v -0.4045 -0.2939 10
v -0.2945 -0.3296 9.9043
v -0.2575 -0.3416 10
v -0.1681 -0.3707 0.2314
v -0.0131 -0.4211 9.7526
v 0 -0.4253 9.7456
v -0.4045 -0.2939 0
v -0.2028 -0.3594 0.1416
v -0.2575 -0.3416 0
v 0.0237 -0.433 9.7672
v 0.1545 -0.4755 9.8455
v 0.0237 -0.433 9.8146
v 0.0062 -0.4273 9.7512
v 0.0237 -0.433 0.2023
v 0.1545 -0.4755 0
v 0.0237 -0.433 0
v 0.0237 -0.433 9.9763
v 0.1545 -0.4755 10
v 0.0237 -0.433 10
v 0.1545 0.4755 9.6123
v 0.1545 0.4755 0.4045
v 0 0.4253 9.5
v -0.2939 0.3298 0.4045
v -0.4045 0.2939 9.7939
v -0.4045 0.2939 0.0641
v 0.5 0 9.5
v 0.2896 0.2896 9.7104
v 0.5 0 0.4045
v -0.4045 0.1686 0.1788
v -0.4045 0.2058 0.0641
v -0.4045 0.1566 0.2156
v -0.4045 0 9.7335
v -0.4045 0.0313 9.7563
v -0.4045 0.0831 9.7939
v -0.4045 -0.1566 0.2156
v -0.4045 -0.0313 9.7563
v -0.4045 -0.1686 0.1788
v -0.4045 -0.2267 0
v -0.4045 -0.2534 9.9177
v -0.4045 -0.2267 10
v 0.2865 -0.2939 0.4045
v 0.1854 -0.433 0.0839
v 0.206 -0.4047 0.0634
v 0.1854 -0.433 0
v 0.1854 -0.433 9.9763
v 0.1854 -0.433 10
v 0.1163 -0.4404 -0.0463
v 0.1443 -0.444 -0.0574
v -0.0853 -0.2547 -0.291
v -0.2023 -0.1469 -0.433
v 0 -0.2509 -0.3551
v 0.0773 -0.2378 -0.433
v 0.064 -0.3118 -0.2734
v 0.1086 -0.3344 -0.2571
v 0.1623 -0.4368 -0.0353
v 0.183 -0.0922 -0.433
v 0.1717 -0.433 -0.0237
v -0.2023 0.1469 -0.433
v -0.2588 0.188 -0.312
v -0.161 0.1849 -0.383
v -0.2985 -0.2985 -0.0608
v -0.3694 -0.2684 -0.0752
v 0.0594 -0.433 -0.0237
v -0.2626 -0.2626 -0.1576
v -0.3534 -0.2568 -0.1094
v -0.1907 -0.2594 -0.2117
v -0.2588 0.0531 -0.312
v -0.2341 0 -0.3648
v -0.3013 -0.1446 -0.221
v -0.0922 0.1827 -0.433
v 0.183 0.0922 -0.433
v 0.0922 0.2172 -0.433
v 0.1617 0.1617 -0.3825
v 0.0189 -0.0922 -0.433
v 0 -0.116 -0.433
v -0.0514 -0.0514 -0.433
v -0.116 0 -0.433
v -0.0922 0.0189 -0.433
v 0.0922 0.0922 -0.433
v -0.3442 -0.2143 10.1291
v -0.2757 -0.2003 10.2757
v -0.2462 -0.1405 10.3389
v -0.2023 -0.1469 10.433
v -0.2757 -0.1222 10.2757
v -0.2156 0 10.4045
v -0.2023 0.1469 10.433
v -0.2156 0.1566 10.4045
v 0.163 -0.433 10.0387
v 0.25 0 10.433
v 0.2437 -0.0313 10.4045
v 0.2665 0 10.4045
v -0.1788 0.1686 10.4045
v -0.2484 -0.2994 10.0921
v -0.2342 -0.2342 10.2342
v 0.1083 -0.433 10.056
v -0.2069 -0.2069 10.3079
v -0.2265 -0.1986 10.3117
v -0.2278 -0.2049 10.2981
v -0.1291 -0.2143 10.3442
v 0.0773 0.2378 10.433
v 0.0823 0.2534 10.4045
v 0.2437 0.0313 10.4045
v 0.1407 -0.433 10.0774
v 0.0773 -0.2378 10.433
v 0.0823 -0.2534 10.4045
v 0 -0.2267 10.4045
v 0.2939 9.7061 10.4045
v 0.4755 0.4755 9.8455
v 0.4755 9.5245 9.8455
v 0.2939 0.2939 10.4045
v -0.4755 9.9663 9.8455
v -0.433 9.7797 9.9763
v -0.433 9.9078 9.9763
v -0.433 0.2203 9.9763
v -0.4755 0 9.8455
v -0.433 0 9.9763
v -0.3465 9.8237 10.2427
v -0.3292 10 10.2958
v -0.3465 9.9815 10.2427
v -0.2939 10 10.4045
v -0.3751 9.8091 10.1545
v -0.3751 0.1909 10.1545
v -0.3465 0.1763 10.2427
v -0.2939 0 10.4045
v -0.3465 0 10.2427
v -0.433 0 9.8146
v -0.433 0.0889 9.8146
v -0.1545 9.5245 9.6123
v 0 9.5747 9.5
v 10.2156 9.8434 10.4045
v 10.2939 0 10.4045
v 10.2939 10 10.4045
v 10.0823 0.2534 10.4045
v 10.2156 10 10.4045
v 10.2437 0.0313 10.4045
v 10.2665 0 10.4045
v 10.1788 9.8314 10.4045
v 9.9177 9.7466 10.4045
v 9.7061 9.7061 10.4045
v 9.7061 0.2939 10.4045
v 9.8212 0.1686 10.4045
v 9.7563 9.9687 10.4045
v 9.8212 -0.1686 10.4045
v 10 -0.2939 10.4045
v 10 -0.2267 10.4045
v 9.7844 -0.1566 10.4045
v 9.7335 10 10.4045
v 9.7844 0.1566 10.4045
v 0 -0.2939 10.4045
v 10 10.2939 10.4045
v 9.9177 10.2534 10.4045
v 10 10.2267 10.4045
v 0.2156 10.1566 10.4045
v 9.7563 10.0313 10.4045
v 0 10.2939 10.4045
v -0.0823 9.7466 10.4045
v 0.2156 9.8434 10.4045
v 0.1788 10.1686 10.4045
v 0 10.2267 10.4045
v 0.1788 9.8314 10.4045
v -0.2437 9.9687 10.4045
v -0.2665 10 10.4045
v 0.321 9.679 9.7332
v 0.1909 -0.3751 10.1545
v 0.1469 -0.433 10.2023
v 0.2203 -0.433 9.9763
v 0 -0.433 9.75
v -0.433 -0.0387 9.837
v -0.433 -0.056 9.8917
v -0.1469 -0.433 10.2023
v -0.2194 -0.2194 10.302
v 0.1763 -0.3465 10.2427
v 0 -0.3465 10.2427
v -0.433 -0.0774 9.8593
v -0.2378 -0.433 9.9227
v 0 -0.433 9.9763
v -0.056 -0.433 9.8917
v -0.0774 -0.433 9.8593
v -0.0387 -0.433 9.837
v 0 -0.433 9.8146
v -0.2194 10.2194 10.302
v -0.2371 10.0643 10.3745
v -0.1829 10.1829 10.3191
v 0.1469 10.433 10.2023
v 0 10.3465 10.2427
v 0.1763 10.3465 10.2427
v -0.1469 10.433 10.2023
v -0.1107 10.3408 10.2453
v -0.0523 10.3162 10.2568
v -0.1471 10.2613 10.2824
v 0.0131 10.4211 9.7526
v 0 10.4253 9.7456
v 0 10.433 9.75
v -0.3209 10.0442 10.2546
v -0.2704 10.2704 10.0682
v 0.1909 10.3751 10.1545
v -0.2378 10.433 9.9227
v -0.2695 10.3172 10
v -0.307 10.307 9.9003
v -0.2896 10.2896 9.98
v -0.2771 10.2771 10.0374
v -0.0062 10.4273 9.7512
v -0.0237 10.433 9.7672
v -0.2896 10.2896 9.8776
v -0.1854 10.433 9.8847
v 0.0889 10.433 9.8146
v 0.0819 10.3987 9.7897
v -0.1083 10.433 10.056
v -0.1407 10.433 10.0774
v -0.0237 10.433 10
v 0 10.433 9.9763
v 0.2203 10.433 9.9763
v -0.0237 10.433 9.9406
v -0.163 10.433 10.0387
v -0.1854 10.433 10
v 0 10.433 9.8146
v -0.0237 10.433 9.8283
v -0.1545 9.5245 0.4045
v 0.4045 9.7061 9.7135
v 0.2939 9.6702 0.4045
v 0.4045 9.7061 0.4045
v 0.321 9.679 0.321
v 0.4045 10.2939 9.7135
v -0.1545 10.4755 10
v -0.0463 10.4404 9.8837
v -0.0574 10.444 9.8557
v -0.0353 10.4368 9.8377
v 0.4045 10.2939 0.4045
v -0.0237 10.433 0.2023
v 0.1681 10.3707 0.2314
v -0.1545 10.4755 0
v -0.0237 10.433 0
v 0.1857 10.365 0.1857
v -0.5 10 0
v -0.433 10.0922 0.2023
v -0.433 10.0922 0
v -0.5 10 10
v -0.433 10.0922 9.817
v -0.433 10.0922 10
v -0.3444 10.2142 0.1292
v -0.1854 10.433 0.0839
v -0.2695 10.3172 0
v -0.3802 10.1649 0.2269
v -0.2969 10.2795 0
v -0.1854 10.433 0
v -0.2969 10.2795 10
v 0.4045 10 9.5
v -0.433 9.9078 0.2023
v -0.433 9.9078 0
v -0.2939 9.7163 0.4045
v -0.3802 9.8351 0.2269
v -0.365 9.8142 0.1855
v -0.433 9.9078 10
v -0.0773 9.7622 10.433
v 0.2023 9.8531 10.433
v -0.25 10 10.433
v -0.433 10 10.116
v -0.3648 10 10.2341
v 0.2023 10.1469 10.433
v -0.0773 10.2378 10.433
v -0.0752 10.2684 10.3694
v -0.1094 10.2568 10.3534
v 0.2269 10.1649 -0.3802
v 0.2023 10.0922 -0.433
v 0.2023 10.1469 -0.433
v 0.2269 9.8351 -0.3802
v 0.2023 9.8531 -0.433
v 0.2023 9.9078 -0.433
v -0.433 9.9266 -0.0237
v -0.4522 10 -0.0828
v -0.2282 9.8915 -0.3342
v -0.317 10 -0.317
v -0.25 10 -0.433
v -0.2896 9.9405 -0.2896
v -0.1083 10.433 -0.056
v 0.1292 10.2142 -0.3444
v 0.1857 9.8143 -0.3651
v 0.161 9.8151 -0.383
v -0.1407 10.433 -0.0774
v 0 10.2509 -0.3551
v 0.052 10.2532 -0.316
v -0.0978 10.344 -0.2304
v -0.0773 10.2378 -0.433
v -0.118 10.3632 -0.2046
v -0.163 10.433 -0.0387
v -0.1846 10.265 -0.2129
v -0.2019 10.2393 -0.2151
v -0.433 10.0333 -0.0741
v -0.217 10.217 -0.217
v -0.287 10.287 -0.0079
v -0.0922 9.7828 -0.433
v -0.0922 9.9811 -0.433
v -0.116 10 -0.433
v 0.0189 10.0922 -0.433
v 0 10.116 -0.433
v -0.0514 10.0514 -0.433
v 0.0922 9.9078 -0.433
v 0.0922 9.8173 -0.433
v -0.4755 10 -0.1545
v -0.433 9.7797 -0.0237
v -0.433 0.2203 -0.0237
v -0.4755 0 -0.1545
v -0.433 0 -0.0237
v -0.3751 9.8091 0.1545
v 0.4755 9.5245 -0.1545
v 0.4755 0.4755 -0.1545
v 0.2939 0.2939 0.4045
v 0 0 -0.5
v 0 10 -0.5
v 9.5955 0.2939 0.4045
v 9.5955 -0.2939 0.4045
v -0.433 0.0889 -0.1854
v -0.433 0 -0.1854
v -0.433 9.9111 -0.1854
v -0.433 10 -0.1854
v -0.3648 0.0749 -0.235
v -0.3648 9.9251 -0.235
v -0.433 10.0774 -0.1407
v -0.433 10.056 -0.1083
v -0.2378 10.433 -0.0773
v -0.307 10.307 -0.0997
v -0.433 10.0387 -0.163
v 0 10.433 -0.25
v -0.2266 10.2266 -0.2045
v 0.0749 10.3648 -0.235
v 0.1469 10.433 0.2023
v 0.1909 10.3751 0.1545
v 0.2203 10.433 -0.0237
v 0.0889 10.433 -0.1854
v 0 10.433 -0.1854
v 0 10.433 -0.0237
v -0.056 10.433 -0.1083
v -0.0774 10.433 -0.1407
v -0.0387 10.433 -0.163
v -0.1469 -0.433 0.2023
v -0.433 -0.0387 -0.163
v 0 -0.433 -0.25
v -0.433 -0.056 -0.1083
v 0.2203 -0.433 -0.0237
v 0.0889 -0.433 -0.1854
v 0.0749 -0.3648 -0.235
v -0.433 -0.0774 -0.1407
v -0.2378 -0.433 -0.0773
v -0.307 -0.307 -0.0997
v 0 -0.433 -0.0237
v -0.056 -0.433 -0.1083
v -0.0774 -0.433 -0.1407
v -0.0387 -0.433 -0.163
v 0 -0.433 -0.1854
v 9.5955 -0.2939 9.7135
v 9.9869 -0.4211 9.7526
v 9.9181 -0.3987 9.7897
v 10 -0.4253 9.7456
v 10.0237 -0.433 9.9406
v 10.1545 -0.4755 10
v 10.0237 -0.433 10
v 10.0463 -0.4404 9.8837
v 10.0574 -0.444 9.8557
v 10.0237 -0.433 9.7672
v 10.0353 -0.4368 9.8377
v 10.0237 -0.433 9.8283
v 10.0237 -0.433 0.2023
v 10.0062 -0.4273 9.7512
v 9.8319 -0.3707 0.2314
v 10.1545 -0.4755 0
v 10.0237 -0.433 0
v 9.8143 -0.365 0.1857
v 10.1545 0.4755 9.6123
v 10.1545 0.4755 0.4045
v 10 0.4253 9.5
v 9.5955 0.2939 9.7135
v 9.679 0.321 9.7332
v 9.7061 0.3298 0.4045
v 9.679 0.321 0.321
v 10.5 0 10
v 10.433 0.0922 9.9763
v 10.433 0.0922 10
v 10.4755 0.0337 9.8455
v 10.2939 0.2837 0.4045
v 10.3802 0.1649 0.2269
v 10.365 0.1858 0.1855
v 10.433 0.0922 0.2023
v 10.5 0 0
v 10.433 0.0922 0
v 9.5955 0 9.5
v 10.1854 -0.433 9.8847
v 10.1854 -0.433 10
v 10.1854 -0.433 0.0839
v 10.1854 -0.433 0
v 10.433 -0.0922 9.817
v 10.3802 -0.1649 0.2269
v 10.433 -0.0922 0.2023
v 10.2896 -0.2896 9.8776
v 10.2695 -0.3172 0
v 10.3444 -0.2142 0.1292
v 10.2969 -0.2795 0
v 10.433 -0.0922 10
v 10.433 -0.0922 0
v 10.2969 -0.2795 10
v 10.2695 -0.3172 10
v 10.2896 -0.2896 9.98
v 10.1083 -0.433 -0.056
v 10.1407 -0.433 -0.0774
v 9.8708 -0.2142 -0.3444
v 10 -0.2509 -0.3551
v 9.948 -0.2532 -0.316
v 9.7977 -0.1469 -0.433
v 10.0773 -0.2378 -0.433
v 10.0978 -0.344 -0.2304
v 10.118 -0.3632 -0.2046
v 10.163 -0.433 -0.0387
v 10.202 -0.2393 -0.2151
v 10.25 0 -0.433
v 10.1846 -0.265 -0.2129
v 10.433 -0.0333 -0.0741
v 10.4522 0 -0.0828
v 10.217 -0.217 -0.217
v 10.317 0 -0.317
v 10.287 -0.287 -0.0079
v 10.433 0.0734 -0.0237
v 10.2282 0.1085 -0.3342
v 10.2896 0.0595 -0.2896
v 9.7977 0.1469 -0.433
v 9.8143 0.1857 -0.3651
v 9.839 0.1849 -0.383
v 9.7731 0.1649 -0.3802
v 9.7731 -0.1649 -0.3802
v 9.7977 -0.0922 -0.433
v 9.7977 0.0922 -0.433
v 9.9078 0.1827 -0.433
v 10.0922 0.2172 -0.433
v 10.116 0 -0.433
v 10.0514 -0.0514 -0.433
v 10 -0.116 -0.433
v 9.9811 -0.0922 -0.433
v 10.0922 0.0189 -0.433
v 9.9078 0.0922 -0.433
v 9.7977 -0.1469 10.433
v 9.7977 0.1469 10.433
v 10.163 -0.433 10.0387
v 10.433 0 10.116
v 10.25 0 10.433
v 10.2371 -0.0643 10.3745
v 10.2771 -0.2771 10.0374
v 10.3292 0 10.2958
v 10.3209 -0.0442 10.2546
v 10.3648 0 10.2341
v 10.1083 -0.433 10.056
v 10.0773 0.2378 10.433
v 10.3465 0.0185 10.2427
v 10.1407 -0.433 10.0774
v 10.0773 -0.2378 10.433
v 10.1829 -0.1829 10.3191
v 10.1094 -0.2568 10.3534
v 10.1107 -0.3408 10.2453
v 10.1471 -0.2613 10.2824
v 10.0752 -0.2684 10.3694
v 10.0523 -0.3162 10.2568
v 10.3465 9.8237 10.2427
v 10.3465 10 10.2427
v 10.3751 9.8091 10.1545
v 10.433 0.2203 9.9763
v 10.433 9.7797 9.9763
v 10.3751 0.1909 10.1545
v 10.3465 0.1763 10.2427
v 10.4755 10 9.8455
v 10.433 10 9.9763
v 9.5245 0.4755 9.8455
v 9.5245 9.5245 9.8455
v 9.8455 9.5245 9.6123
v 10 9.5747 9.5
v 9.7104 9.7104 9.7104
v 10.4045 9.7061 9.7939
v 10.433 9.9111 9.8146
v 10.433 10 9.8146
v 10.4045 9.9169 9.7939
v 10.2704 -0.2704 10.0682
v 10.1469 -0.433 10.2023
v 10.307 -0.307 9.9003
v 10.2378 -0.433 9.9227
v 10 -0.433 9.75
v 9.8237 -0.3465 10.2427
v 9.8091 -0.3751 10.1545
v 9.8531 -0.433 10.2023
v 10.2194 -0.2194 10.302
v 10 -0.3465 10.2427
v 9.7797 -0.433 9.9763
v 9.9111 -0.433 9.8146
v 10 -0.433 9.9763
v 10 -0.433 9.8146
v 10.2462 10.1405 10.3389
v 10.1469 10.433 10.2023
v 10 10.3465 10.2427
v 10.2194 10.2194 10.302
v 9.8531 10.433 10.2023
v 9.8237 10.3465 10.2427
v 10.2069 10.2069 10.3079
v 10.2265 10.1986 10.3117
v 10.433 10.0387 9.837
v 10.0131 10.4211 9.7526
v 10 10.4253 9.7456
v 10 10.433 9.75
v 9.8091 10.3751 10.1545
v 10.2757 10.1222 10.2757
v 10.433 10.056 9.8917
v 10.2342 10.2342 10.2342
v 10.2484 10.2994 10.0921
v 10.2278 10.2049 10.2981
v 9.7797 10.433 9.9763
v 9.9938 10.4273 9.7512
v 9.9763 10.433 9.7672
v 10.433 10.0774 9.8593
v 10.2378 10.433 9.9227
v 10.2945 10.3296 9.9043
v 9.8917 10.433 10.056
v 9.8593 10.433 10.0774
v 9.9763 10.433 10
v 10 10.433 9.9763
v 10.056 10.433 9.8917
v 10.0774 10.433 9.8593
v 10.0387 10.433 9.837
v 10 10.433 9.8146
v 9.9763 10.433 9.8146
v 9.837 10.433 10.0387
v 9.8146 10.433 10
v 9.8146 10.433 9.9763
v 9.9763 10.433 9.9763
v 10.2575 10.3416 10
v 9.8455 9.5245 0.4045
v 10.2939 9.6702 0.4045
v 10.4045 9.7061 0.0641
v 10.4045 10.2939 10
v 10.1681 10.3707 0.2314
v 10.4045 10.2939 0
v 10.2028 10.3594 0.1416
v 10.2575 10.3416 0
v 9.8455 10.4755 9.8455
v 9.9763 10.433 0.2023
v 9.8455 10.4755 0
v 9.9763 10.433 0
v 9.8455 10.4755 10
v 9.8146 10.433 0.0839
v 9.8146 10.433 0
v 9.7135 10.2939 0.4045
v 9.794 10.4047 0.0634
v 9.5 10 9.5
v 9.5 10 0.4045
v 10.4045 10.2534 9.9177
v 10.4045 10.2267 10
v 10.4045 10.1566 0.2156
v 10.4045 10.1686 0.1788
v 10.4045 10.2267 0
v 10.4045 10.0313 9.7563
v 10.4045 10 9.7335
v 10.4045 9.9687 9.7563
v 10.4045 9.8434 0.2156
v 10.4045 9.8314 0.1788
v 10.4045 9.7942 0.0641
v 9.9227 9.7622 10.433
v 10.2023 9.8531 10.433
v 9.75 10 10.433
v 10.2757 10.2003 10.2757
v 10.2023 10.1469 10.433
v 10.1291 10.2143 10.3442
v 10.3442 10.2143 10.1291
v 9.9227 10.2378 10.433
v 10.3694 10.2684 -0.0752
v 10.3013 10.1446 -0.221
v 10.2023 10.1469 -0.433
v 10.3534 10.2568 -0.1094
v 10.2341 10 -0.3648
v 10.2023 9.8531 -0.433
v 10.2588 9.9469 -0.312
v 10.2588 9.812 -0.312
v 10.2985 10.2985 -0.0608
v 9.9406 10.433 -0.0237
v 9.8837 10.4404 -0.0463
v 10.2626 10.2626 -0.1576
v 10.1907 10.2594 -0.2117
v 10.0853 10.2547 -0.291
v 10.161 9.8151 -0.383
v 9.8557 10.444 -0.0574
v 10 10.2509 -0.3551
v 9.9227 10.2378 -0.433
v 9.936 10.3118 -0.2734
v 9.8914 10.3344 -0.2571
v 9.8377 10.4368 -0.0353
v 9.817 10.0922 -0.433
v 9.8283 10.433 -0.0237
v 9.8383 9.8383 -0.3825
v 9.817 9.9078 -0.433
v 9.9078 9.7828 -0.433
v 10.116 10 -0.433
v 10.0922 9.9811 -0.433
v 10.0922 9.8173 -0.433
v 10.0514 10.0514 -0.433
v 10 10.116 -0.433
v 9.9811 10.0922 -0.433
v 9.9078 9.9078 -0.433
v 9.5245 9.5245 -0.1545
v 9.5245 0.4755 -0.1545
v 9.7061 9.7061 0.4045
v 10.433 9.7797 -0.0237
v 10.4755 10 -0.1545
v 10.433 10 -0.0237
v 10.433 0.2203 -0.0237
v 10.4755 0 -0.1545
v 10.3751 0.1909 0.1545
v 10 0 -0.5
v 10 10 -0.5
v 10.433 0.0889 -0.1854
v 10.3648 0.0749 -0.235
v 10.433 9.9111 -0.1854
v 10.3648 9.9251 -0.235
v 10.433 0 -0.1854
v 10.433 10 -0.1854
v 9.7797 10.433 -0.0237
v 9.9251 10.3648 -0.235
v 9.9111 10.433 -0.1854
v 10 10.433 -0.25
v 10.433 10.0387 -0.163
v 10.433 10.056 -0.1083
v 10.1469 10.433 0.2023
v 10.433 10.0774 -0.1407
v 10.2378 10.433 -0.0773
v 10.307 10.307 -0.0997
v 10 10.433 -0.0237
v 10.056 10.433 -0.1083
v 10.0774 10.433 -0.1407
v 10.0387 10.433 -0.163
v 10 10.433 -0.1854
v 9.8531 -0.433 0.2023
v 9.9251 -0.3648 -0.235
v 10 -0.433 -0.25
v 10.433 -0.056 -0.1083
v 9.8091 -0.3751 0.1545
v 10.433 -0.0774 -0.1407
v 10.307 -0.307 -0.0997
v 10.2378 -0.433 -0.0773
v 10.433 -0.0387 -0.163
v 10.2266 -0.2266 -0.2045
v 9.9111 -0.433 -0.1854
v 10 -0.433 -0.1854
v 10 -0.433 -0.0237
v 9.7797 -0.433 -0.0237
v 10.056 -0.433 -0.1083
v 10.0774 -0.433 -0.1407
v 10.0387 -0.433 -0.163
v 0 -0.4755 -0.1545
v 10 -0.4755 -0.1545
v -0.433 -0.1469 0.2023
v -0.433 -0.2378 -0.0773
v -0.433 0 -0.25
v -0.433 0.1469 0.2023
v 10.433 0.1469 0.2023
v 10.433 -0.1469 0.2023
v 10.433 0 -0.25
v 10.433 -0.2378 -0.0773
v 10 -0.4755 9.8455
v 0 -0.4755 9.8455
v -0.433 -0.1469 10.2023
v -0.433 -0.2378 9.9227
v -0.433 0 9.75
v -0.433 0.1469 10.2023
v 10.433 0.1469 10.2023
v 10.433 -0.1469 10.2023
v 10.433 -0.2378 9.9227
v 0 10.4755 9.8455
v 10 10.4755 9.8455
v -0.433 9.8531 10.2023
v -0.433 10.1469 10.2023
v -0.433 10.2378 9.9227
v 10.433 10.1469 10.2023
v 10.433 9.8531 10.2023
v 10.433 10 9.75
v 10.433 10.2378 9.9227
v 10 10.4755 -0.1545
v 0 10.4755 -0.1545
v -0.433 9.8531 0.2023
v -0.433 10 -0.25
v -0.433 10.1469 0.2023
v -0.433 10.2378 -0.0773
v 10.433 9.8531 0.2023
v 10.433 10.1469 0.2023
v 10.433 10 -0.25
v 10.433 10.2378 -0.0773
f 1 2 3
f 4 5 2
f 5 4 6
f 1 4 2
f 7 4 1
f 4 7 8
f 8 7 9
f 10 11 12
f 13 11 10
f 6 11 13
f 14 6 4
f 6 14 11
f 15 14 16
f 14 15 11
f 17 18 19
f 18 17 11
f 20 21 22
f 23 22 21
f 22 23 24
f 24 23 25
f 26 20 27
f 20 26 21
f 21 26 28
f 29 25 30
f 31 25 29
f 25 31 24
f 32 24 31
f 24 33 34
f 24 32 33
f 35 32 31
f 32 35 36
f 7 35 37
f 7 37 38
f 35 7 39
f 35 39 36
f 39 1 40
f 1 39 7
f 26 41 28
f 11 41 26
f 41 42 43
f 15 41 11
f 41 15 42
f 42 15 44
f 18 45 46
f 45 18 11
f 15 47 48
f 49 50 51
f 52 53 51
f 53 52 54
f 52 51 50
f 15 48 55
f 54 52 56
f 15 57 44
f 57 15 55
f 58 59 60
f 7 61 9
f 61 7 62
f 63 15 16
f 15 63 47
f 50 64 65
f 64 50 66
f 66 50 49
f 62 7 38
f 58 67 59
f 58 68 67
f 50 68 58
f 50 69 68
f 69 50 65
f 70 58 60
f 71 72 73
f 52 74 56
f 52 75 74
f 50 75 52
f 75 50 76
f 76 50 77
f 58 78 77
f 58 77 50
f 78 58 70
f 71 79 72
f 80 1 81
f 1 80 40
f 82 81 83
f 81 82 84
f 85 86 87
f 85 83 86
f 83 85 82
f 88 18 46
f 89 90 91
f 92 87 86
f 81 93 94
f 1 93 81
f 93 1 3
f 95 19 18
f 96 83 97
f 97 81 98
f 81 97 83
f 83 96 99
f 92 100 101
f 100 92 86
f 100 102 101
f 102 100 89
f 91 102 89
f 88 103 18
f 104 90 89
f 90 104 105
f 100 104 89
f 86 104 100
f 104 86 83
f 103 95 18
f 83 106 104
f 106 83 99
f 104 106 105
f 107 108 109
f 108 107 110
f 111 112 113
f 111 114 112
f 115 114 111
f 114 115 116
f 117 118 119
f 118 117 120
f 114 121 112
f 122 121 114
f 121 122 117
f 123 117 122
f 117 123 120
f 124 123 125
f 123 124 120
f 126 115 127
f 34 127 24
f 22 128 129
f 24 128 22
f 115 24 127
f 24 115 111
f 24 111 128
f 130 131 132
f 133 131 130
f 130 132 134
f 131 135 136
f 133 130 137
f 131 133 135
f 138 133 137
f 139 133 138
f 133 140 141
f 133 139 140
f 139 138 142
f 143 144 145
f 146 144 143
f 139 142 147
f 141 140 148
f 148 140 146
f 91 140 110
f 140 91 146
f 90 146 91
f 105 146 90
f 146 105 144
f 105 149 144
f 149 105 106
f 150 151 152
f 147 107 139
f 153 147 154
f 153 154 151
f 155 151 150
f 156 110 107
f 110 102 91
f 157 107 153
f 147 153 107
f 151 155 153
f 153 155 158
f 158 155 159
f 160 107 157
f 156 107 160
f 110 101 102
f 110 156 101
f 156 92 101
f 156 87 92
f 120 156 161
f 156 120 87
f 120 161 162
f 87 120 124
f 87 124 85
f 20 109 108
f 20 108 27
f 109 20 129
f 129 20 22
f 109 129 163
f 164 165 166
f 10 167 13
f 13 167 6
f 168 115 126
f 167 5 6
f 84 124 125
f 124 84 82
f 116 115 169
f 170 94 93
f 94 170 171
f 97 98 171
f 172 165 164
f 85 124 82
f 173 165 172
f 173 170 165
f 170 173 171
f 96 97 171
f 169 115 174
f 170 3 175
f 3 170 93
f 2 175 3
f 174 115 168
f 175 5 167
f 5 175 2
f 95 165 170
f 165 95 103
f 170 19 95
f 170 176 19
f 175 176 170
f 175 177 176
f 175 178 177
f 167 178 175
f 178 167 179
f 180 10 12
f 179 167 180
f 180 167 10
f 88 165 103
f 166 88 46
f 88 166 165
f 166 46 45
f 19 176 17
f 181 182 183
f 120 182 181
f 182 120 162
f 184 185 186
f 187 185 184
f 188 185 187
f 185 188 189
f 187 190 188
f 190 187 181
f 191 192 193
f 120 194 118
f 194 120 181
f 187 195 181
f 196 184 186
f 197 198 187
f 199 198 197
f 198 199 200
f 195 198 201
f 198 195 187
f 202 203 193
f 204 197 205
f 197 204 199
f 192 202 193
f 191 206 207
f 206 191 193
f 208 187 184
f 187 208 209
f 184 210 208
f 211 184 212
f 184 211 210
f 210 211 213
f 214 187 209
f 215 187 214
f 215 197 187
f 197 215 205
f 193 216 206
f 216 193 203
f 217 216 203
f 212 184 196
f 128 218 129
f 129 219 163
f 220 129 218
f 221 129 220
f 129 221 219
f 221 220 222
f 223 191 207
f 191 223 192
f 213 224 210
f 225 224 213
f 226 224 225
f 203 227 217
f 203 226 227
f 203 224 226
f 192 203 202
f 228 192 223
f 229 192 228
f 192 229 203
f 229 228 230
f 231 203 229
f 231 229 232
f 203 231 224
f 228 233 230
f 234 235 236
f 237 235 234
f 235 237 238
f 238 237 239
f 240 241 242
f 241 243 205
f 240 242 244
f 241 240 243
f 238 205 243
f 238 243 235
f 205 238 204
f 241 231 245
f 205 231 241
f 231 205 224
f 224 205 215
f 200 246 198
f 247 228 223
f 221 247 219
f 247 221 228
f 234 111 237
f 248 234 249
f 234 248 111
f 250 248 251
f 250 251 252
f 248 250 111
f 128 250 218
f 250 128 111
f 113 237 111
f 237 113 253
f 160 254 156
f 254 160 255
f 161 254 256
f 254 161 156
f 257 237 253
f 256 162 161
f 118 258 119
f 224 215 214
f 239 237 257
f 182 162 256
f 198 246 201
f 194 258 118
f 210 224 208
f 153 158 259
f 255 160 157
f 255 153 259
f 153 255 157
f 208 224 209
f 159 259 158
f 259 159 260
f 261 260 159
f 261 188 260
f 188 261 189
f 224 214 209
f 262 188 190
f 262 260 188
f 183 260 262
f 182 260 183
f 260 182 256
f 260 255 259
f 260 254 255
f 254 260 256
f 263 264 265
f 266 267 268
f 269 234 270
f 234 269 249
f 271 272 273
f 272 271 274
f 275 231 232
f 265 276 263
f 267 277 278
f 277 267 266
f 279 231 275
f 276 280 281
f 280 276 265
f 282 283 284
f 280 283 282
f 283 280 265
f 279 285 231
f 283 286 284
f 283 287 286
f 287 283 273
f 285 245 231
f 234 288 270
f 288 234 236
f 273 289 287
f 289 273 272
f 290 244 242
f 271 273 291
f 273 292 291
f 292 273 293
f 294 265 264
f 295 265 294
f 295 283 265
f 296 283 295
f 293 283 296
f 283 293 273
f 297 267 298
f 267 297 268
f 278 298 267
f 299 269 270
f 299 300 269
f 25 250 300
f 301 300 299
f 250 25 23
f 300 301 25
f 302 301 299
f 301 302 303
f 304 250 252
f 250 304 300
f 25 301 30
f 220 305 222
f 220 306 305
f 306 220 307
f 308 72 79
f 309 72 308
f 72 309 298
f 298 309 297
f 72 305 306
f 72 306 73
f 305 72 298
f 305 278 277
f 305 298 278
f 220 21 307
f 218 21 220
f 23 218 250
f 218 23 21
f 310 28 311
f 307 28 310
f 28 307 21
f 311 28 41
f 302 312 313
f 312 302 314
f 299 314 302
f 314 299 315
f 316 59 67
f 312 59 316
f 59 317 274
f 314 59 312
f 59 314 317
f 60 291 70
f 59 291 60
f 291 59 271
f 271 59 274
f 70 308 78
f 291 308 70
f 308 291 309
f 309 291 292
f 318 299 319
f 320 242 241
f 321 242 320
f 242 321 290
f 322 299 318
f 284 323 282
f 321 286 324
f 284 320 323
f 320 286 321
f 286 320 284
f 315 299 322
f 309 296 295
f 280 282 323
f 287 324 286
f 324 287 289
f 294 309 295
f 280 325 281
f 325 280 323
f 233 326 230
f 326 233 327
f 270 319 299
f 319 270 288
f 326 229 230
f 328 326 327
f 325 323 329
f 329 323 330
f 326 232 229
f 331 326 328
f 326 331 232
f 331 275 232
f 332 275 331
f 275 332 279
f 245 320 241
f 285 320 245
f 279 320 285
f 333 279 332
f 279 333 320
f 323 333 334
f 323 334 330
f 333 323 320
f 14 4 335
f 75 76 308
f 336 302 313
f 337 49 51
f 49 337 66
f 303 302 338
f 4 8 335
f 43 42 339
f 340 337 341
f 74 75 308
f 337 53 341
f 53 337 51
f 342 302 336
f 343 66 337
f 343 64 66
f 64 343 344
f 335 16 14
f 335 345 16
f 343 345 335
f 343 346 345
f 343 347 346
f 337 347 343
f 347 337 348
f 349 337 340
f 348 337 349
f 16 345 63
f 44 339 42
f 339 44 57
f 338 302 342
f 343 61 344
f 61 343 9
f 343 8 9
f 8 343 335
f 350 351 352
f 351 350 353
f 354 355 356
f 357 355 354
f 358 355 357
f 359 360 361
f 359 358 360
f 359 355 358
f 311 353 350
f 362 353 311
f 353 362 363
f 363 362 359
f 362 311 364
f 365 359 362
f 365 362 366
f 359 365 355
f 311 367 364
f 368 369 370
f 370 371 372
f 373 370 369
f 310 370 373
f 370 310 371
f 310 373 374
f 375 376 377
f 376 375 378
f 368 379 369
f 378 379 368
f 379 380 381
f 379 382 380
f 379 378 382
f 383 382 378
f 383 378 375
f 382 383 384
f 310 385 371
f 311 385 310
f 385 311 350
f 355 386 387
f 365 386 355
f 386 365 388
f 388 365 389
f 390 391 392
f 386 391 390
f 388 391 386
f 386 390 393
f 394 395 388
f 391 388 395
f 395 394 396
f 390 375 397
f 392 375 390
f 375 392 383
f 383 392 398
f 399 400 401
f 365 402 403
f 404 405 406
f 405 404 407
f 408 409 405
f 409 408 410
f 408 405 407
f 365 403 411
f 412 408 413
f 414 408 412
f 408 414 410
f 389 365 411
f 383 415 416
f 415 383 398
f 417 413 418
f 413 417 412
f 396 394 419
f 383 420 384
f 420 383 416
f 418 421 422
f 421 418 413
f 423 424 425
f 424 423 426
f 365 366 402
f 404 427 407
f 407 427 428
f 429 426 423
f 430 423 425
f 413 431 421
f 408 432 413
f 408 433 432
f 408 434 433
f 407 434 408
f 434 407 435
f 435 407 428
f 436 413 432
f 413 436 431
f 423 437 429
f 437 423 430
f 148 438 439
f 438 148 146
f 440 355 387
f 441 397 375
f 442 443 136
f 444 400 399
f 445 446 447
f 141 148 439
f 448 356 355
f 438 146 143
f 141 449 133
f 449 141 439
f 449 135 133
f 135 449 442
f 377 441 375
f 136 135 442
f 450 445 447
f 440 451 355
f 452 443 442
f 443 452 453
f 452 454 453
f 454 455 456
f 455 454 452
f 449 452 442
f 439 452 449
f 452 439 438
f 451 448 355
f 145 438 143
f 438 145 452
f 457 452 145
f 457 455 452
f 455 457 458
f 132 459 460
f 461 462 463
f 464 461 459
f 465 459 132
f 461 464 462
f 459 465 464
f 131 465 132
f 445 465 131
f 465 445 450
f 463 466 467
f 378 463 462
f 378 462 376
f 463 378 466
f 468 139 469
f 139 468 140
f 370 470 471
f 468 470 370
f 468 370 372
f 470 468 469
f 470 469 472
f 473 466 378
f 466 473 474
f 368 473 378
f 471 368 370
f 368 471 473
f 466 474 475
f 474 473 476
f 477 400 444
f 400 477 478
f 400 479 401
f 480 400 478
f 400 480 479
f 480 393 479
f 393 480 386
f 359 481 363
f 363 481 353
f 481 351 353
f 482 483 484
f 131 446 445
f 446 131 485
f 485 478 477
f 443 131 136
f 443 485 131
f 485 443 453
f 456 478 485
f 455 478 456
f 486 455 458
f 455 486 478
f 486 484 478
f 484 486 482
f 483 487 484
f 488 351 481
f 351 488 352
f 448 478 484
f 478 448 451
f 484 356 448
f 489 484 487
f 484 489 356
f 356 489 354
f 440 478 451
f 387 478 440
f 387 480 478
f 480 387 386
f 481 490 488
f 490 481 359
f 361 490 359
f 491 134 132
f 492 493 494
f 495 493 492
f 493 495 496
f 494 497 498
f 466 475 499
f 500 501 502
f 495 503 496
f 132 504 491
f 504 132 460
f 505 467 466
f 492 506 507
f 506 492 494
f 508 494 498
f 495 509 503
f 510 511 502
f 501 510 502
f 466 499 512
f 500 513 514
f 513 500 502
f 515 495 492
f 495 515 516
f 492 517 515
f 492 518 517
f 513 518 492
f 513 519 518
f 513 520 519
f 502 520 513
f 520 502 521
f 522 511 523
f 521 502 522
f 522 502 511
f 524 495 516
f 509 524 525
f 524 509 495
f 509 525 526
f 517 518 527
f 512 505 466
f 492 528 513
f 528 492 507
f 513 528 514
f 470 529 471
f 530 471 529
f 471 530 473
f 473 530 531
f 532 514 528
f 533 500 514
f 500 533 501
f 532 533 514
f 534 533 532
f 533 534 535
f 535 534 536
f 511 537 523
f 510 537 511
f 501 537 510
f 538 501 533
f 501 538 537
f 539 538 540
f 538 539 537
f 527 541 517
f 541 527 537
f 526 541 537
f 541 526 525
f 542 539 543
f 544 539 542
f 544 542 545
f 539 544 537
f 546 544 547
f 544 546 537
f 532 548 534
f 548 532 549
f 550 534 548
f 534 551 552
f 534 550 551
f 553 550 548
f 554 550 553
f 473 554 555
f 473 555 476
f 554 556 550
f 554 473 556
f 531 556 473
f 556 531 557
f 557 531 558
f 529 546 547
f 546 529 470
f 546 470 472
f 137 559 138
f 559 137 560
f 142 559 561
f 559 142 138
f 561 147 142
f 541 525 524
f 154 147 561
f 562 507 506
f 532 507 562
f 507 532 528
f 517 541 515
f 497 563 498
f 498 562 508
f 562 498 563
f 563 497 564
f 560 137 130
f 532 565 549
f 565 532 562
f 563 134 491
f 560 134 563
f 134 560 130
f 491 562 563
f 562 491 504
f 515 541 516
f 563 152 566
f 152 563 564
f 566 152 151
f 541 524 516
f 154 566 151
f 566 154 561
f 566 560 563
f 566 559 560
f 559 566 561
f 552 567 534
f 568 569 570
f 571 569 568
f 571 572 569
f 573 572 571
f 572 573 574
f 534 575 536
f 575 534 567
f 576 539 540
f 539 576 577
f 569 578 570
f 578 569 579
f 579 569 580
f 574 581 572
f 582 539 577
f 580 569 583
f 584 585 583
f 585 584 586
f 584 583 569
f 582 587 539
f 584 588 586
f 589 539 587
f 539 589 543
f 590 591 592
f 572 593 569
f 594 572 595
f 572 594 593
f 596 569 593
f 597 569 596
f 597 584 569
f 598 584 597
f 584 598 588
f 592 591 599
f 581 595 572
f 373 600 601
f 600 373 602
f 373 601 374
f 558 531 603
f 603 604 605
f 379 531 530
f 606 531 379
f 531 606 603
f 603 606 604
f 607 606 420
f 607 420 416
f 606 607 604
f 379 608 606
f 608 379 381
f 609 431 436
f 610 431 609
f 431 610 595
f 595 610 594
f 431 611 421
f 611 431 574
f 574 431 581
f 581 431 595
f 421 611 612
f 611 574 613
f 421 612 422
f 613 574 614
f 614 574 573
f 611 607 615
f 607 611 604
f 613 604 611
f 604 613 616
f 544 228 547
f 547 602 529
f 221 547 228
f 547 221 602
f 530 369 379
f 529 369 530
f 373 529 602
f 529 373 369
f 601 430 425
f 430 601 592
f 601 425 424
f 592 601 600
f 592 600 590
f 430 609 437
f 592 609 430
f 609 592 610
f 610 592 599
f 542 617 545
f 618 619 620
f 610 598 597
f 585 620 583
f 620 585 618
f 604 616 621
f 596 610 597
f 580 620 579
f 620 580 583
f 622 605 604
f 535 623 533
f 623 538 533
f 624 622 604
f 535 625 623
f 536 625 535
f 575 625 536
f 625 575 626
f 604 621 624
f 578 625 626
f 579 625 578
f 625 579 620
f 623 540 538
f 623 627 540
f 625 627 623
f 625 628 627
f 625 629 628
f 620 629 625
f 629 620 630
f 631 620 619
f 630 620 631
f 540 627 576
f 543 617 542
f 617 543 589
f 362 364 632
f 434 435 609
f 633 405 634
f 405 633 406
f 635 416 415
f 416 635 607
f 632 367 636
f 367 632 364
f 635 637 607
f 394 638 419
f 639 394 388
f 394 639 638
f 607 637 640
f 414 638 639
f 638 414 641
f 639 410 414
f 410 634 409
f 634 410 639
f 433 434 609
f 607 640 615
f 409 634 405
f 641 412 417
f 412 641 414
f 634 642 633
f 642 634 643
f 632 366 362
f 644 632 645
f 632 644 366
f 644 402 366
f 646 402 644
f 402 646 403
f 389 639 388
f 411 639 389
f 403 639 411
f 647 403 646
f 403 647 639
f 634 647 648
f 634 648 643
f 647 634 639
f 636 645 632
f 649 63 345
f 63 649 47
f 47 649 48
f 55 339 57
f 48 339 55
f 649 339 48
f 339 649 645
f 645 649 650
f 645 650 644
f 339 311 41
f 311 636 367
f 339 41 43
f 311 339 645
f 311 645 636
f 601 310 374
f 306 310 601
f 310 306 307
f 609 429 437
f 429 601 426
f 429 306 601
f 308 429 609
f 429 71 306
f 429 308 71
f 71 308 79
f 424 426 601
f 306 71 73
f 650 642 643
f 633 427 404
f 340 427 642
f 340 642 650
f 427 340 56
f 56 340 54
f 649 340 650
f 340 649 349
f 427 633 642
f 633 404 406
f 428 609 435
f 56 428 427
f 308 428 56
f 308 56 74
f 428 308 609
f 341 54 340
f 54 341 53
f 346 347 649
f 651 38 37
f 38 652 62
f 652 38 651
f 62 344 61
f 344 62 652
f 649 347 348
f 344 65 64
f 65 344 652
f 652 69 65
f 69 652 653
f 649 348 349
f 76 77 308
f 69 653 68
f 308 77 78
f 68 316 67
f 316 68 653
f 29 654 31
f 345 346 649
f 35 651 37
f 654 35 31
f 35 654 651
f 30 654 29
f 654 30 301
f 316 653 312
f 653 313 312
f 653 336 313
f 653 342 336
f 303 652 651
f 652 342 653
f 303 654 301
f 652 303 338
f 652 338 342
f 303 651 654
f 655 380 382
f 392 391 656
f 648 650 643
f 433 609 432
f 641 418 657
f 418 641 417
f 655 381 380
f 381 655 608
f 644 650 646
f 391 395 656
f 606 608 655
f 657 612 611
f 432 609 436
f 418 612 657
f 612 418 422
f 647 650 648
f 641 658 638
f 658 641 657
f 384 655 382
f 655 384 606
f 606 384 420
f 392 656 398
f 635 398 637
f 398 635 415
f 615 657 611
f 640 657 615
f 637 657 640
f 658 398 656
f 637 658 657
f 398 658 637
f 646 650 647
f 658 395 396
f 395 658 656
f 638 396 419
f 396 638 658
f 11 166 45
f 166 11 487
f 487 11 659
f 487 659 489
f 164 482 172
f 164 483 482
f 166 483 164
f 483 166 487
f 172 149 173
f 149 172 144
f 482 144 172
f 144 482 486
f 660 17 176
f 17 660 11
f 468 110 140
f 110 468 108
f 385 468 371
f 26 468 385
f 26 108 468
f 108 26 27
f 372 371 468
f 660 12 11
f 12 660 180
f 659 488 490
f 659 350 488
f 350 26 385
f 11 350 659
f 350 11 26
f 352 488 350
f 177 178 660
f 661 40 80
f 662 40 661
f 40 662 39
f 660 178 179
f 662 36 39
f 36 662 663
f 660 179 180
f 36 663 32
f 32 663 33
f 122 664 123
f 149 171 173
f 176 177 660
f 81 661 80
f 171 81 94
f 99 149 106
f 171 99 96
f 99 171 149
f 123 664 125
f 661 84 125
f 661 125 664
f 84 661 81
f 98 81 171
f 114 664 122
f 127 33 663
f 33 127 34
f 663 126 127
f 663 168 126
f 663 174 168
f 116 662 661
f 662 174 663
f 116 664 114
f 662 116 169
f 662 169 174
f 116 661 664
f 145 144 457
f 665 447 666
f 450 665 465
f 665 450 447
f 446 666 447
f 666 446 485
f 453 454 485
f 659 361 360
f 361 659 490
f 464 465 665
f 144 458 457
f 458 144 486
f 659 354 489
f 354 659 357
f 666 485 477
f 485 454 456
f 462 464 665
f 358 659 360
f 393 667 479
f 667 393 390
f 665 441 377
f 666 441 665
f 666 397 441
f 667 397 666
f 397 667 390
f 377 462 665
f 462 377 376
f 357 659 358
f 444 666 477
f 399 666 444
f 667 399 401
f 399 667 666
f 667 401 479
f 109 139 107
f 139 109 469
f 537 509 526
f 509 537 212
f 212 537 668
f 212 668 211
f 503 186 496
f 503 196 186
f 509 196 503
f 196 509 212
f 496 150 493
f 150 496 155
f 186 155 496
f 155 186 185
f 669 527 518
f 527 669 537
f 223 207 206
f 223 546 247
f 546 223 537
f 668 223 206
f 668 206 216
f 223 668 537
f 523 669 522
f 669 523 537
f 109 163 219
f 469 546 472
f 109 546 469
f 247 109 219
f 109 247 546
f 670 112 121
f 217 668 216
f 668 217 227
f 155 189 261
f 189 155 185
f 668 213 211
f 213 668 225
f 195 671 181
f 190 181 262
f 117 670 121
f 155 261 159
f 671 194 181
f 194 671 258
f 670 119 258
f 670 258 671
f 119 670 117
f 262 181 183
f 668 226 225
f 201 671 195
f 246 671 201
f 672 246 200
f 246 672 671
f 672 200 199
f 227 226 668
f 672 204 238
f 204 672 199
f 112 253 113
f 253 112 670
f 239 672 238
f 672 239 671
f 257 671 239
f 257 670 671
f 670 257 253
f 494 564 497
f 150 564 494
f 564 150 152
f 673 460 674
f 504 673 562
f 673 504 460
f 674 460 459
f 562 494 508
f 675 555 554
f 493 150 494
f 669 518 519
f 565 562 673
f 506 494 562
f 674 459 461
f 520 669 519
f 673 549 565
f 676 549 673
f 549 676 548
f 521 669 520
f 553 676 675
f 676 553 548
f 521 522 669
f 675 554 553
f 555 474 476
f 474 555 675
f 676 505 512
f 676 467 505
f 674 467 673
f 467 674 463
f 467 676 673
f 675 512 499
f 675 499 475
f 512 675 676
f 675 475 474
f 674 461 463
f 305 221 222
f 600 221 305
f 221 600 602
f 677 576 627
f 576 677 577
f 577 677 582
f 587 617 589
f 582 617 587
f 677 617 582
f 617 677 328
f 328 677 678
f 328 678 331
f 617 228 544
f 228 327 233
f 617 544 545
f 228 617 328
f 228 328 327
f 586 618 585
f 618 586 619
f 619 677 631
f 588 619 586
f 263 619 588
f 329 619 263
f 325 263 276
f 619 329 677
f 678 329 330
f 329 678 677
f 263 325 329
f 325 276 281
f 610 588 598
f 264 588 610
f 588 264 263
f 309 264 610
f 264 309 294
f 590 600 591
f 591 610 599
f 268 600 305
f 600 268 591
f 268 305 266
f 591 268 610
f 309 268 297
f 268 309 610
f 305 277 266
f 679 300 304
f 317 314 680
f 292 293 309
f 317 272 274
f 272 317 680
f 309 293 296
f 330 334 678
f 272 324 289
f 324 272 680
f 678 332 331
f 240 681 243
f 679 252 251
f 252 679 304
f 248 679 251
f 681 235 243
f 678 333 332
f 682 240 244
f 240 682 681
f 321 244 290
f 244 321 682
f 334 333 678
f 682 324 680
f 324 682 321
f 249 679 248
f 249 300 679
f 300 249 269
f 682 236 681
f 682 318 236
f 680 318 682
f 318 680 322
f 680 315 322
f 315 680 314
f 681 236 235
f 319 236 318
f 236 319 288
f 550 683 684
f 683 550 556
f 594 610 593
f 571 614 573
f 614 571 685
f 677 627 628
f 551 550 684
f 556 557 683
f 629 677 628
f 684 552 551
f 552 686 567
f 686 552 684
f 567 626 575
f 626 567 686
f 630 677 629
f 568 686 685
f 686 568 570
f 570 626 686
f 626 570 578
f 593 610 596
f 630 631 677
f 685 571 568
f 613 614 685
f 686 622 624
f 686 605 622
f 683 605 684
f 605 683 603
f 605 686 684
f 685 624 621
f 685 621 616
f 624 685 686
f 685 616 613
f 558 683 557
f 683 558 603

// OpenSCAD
// file: beam.scad
// File: beam.scad
// Author: K R Sloan
// Last Modified: 30 October 2014
// Purpose: define a "beam"
//          this is a simple minded cylinder with spherical endcaps
//          to do something different, change it!
module beam(h=1.0, r=1.0)
{

 cylinder(h=h,r=r);
 sphere(r=r);
 translate([0,0,h])
  sphere(r=r);
}
// main file
// File: Beams.scad
// Author: K R Sloan
// Last Modified: 30 October 2014
// Purpose: create objects out of "beams"
//
// beam.scad defines a "beam"
// for a different style, change beam.scad
// probably, maintain several alternatives, and swap in as needed
use <beam.scad>


function L2squared(a,b) = pow(b[0]-a[0],2)+pow(b[1]-a[1],2)+pow(b[2]-a[2],2);
function L2(a,b) = sqrt(L2squared(a,b));
function angleAboutY(a,b) = atan2(sqrt(L2squared(a,b)-pow(b[2]-a[2],2)), b[2]-a[2]);
//function angleAboutY(a,b) = atan2(L2squared(a,b)-pow(b[2]-a[2],2), b[2]-a[2]);
function angleAboutZ(a,b) = atan2(b[1]-a[1], b[0]-a[0]);

// 
// beam(h=<height>,r=<radius>) produces a beam of height <height> and radius <radius>
//
// just like "cylinder" (but perhaps much more complex)
//
// our job is to create and position a beam so that it starts at [x0,y0,z0]
//  and ends at [x1,y1,z1]

module position_beam(a=[0,0,0], b=[1,2,3], radius=1.0)
{
echo(L2squared(a,b));
echo(angleAboutY(a,b));
echo(angleAboutZ(a,b));

echo(L2squared(a,b));

echo(pow(b[2]-a[2],2));
 translate(a)
  rotate([0,0,angleAboutZ(a,b)])
   rotate([0,angleAboutY(a,b),0])
     beam(h=L2(a,b),r=radius);
}

// sample usage - a cube

r = 0.5;
position_beam(a=[ 0, 0, 0],b=[ 0, 0,10],radius=r);
position_beam(a=[ 0, 0,10],b=[ 0,10,10],radius=r);
position_beam(a=[ 0,10,10],b=[ 0,10, 0],radius=r);
position_beam(a=[ 0,10, 0],b=[ 0, 0, 0],radius=r);

position_beam(a=[10, 0, 0],b=[10, 0,10],radius=r);
position_beam(a=[10, 0,10],b=[10,10,10],radius=r);
position_beam(a=[10,10,10],b=[10,10, 0],radius=r);
position_beam(a=[10,10, 0],b=[10, 0, 0],radius=r);

position_beam(a=[ 0, 0, 0],b=[10, 0, 0],radius=r);
position_beam(a=[ 0, 0,10],b=[10, 0,10],radius=r);
position_beam(a=[ 0,10,10],b=[10,10,10],radius=r);
position_beam(a=[ 0,10, 0],b=[10,10, 0],radius=r);
